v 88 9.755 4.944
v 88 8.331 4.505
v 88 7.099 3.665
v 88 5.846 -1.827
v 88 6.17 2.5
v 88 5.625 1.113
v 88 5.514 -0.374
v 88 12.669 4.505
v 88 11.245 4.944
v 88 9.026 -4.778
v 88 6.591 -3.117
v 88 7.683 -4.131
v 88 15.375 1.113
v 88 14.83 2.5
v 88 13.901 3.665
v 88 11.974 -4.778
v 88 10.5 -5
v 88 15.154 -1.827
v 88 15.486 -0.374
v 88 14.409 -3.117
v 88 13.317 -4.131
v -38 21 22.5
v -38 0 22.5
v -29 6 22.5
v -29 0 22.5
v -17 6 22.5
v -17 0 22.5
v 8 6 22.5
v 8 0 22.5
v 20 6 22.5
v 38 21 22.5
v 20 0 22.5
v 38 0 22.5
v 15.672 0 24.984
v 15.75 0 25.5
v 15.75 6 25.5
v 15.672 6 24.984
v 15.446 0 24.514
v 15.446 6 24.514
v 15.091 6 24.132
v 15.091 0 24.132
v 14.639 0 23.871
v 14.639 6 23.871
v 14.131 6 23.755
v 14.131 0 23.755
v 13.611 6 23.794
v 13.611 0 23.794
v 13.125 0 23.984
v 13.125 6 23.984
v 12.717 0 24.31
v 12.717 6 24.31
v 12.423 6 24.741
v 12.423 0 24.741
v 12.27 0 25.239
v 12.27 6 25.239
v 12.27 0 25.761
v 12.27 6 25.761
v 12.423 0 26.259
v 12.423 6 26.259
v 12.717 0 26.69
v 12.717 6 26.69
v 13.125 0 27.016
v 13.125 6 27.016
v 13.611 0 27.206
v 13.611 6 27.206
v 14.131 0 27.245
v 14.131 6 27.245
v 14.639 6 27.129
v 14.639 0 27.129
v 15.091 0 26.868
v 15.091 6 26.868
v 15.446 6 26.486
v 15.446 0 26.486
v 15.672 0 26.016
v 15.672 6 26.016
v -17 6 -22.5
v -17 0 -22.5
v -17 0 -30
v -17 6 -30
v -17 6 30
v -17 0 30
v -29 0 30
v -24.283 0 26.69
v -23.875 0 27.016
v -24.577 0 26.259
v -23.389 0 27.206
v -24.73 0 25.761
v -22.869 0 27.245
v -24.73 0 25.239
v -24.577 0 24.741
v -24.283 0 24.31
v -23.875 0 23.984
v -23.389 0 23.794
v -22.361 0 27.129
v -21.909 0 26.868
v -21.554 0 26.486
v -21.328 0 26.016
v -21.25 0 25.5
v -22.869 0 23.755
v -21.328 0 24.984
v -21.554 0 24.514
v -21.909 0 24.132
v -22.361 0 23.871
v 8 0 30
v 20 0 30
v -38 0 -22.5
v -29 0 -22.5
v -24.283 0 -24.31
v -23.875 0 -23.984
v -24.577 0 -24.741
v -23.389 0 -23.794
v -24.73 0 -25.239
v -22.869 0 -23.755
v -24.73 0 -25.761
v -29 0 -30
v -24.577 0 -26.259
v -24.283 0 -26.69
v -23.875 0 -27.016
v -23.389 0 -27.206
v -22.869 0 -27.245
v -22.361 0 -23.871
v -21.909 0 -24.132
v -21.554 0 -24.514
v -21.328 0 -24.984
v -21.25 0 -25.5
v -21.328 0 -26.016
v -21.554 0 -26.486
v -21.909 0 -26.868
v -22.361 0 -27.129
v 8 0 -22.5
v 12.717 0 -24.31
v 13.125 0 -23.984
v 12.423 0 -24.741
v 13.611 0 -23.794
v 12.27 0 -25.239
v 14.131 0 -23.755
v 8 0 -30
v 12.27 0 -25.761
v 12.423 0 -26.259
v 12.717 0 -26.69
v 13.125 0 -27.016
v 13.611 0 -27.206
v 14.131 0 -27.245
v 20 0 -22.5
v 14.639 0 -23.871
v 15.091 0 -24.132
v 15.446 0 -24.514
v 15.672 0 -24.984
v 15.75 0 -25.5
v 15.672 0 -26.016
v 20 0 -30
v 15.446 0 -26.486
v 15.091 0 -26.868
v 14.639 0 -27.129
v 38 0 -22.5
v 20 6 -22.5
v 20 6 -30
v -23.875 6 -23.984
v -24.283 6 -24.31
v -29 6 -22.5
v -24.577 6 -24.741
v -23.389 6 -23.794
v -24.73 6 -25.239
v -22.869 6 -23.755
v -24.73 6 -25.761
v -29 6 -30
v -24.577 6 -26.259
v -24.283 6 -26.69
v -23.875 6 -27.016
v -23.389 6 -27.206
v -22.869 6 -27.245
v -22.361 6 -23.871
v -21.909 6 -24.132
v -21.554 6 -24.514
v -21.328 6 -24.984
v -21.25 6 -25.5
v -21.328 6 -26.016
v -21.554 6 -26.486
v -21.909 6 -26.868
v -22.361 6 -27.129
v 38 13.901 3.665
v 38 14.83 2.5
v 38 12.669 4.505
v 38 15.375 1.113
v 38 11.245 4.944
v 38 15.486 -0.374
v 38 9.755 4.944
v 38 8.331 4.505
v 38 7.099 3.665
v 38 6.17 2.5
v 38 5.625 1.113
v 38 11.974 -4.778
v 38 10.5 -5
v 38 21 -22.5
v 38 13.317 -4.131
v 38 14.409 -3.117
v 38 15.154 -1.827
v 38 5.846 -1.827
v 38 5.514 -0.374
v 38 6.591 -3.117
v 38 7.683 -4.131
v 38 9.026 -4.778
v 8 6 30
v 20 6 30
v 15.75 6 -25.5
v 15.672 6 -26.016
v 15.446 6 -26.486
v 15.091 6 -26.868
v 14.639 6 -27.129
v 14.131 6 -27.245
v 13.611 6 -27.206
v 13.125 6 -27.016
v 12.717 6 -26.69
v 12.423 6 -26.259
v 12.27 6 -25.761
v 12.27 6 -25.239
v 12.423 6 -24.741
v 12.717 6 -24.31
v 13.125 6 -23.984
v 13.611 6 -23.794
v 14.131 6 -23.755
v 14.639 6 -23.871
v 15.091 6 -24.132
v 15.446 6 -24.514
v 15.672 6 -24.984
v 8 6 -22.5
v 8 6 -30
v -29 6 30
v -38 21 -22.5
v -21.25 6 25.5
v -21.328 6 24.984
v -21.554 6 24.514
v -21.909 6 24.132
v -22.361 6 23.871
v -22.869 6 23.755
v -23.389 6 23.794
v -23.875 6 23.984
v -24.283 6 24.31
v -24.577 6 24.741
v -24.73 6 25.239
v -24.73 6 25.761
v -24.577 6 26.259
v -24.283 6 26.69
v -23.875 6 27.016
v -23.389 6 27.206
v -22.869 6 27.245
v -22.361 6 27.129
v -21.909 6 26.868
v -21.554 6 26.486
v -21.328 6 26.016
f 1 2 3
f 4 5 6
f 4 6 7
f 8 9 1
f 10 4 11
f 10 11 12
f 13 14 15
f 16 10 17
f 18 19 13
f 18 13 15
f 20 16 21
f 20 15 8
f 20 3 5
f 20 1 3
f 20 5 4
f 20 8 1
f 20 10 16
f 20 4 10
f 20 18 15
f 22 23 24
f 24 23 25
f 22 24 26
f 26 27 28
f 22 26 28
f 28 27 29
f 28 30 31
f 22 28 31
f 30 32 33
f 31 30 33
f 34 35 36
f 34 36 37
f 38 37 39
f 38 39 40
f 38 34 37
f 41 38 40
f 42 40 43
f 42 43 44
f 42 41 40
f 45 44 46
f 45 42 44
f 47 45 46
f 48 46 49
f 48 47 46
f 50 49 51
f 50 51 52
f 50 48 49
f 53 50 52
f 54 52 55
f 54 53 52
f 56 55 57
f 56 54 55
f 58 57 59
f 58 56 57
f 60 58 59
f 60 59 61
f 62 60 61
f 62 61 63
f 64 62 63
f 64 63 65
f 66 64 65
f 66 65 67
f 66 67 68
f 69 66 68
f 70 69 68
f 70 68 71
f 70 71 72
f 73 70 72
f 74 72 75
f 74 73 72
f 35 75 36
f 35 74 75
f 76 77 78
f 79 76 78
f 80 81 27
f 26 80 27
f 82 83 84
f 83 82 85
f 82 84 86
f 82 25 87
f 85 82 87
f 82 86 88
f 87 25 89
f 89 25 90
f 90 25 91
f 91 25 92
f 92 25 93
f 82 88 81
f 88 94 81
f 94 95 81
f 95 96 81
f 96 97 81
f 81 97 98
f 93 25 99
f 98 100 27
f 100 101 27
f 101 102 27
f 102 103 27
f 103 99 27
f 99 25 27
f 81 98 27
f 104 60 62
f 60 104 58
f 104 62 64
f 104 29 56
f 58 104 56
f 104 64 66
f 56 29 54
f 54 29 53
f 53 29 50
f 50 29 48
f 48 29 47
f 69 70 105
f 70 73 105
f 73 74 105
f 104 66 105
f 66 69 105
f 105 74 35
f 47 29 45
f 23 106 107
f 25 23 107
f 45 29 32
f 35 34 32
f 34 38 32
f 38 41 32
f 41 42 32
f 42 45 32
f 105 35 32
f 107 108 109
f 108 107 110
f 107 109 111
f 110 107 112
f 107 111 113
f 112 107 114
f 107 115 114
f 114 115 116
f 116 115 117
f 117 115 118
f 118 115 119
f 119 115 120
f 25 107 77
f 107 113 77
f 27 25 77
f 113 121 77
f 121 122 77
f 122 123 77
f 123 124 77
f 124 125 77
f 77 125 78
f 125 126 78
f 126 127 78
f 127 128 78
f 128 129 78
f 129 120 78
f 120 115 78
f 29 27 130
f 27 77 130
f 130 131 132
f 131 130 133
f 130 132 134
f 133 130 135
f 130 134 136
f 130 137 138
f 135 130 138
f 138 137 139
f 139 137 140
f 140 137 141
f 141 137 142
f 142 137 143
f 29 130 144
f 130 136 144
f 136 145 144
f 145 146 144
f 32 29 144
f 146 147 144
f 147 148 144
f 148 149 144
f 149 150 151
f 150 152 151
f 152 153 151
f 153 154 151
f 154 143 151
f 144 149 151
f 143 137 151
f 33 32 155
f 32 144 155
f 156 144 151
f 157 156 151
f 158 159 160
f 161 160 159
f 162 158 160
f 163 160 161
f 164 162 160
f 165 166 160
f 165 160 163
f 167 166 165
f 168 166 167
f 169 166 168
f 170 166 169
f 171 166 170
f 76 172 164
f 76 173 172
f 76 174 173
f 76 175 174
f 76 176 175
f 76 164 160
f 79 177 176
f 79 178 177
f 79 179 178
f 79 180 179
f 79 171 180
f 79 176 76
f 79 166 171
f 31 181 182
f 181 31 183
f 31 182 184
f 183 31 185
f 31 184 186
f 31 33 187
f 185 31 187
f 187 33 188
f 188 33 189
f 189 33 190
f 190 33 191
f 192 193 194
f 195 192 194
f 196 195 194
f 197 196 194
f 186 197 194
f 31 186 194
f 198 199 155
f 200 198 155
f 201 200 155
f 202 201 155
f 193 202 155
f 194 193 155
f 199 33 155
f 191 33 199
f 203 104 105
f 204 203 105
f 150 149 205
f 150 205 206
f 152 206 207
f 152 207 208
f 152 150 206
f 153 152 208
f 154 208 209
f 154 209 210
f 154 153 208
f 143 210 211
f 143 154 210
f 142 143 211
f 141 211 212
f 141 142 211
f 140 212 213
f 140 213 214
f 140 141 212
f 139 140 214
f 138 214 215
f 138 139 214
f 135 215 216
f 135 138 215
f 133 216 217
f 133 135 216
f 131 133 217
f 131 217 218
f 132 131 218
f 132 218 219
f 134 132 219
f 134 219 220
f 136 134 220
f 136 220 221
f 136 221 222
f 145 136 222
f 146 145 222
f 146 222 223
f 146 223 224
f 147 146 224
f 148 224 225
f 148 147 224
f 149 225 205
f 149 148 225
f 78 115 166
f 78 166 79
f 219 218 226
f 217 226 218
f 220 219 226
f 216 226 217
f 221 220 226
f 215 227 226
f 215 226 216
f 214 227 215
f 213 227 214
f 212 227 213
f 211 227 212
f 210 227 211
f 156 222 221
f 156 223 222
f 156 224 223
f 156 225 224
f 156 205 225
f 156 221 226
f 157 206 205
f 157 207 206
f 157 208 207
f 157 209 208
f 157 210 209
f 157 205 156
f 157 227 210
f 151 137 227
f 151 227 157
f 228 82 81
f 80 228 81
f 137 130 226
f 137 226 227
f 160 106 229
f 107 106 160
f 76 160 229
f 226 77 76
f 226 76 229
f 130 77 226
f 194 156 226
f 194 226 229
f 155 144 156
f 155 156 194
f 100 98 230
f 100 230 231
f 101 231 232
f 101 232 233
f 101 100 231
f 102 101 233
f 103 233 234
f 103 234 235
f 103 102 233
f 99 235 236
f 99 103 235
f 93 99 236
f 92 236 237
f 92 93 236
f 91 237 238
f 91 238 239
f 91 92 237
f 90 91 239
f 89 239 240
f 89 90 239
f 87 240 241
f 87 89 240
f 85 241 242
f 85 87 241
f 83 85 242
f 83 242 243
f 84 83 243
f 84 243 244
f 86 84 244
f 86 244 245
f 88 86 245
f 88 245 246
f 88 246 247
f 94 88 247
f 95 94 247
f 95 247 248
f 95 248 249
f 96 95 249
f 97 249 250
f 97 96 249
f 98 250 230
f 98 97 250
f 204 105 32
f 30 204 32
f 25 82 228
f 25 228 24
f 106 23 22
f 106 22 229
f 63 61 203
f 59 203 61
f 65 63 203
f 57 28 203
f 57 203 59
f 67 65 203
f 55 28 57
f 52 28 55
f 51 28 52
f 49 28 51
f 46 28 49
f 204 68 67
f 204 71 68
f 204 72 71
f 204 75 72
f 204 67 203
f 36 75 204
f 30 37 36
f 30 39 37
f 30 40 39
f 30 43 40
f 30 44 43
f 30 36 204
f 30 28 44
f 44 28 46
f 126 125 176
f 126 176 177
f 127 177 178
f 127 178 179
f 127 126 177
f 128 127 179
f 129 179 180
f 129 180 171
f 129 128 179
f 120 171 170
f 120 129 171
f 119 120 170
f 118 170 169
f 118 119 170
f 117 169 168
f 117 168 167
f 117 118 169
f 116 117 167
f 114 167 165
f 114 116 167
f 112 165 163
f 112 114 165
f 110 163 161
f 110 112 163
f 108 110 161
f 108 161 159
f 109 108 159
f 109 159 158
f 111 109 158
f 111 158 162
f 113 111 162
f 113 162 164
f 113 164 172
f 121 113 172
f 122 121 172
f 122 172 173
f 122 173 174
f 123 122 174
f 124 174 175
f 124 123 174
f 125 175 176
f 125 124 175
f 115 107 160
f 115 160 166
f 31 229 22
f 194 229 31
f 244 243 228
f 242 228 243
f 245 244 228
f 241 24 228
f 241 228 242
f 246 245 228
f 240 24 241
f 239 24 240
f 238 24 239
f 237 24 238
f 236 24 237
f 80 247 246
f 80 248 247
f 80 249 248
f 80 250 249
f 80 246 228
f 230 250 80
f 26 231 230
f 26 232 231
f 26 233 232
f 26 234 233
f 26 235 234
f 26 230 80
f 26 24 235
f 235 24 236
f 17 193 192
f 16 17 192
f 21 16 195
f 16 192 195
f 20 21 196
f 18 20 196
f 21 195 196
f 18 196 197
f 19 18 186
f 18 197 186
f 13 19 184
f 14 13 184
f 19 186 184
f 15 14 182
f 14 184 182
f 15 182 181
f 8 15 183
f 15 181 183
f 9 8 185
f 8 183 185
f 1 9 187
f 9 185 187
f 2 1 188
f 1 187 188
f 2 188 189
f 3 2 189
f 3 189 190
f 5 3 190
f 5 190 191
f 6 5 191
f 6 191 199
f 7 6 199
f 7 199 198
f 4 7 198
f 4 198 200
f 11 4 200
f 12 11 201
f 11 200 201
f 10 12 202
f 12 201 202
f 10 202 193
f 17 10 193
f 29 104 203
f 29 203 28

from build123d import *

# Parameters (mm, degrees)
SKETCH_1_W      = 76
SKETCH_1_H      = 45
EXTRUDE_1_DEPTH = 21
SKETCH_2_W      = 12
SKETCH_2_H      = 15
SKETCH_2_R      = 1.75
EXTRUDE_2_DEPTH = 6
SKETCH_3_R      = 5
EXTRUDE_3_DEPTH = 50


with BuildPart() as part:
    # 草图1 → 凸台-拉伸1 (new body)
    with BuildSketch(Plane(origin=(0, 0, 0), x_dir=(1, 0, 0), z_dir=(0, 1, 0))):
        Rectangle(SKETCH_1_W, SKETCH_1_H)
    extrude(amount=EXTRUDE_1_DEPTH)

    # 草图2 → 凸台-拉伸2 (add)
    with BuildSketch(Plane(origin=(0, 0, 0), x_dir=(1, 0, 0), z_dir=(0, 1, 0))):
        with Locations((-23, -22.5)):
            Rectangle(SKETCH_2_W, SKETCH_2_H)
        with Locations((-23, -25.5)):
            Circle(SKETCH_2_R, mode=Mode.SUBTRACT)
        with Locations((14, -22.5)):
            Rectangle(SKETCH_2_W, SKETCH_2_H)
        with Locations((14, -25.5)):
            Circle(SKETCH_2_R, mode=Mode.SUBTRACT)
        with Locations((14, 22.5)):
            Rectangle(SKETCH_2_W, SKETCH_2_H)
        with Locations((14, 25.5)):
            Circle(SKETCH_2_R, mode=Mode.SUBTRACT)
        with Locations((-23, 22.5)):
            Rectangle(SKETCH_2_W, SKETCH_2_H)
        with Locations((-23, 25.5)):
            Circle(SKETCH_2_R, mode=Mode.SUBTRACT)
    extrude(amount=EXTRUDE_2_DEPTH)

    # 草图3 → 凸台-拉伸3 (add)
    with BuildSketch(Plane(origin=(38, 0, 0), x_dir=(0, 0, -1), z_dir=(1, 0, 0))):
        with Locations((0, 10.5)):
            Circle(SKETCH_3_R)
    extrude(amount=EXTRUDE_3_DEPTH)


solid = part.part
